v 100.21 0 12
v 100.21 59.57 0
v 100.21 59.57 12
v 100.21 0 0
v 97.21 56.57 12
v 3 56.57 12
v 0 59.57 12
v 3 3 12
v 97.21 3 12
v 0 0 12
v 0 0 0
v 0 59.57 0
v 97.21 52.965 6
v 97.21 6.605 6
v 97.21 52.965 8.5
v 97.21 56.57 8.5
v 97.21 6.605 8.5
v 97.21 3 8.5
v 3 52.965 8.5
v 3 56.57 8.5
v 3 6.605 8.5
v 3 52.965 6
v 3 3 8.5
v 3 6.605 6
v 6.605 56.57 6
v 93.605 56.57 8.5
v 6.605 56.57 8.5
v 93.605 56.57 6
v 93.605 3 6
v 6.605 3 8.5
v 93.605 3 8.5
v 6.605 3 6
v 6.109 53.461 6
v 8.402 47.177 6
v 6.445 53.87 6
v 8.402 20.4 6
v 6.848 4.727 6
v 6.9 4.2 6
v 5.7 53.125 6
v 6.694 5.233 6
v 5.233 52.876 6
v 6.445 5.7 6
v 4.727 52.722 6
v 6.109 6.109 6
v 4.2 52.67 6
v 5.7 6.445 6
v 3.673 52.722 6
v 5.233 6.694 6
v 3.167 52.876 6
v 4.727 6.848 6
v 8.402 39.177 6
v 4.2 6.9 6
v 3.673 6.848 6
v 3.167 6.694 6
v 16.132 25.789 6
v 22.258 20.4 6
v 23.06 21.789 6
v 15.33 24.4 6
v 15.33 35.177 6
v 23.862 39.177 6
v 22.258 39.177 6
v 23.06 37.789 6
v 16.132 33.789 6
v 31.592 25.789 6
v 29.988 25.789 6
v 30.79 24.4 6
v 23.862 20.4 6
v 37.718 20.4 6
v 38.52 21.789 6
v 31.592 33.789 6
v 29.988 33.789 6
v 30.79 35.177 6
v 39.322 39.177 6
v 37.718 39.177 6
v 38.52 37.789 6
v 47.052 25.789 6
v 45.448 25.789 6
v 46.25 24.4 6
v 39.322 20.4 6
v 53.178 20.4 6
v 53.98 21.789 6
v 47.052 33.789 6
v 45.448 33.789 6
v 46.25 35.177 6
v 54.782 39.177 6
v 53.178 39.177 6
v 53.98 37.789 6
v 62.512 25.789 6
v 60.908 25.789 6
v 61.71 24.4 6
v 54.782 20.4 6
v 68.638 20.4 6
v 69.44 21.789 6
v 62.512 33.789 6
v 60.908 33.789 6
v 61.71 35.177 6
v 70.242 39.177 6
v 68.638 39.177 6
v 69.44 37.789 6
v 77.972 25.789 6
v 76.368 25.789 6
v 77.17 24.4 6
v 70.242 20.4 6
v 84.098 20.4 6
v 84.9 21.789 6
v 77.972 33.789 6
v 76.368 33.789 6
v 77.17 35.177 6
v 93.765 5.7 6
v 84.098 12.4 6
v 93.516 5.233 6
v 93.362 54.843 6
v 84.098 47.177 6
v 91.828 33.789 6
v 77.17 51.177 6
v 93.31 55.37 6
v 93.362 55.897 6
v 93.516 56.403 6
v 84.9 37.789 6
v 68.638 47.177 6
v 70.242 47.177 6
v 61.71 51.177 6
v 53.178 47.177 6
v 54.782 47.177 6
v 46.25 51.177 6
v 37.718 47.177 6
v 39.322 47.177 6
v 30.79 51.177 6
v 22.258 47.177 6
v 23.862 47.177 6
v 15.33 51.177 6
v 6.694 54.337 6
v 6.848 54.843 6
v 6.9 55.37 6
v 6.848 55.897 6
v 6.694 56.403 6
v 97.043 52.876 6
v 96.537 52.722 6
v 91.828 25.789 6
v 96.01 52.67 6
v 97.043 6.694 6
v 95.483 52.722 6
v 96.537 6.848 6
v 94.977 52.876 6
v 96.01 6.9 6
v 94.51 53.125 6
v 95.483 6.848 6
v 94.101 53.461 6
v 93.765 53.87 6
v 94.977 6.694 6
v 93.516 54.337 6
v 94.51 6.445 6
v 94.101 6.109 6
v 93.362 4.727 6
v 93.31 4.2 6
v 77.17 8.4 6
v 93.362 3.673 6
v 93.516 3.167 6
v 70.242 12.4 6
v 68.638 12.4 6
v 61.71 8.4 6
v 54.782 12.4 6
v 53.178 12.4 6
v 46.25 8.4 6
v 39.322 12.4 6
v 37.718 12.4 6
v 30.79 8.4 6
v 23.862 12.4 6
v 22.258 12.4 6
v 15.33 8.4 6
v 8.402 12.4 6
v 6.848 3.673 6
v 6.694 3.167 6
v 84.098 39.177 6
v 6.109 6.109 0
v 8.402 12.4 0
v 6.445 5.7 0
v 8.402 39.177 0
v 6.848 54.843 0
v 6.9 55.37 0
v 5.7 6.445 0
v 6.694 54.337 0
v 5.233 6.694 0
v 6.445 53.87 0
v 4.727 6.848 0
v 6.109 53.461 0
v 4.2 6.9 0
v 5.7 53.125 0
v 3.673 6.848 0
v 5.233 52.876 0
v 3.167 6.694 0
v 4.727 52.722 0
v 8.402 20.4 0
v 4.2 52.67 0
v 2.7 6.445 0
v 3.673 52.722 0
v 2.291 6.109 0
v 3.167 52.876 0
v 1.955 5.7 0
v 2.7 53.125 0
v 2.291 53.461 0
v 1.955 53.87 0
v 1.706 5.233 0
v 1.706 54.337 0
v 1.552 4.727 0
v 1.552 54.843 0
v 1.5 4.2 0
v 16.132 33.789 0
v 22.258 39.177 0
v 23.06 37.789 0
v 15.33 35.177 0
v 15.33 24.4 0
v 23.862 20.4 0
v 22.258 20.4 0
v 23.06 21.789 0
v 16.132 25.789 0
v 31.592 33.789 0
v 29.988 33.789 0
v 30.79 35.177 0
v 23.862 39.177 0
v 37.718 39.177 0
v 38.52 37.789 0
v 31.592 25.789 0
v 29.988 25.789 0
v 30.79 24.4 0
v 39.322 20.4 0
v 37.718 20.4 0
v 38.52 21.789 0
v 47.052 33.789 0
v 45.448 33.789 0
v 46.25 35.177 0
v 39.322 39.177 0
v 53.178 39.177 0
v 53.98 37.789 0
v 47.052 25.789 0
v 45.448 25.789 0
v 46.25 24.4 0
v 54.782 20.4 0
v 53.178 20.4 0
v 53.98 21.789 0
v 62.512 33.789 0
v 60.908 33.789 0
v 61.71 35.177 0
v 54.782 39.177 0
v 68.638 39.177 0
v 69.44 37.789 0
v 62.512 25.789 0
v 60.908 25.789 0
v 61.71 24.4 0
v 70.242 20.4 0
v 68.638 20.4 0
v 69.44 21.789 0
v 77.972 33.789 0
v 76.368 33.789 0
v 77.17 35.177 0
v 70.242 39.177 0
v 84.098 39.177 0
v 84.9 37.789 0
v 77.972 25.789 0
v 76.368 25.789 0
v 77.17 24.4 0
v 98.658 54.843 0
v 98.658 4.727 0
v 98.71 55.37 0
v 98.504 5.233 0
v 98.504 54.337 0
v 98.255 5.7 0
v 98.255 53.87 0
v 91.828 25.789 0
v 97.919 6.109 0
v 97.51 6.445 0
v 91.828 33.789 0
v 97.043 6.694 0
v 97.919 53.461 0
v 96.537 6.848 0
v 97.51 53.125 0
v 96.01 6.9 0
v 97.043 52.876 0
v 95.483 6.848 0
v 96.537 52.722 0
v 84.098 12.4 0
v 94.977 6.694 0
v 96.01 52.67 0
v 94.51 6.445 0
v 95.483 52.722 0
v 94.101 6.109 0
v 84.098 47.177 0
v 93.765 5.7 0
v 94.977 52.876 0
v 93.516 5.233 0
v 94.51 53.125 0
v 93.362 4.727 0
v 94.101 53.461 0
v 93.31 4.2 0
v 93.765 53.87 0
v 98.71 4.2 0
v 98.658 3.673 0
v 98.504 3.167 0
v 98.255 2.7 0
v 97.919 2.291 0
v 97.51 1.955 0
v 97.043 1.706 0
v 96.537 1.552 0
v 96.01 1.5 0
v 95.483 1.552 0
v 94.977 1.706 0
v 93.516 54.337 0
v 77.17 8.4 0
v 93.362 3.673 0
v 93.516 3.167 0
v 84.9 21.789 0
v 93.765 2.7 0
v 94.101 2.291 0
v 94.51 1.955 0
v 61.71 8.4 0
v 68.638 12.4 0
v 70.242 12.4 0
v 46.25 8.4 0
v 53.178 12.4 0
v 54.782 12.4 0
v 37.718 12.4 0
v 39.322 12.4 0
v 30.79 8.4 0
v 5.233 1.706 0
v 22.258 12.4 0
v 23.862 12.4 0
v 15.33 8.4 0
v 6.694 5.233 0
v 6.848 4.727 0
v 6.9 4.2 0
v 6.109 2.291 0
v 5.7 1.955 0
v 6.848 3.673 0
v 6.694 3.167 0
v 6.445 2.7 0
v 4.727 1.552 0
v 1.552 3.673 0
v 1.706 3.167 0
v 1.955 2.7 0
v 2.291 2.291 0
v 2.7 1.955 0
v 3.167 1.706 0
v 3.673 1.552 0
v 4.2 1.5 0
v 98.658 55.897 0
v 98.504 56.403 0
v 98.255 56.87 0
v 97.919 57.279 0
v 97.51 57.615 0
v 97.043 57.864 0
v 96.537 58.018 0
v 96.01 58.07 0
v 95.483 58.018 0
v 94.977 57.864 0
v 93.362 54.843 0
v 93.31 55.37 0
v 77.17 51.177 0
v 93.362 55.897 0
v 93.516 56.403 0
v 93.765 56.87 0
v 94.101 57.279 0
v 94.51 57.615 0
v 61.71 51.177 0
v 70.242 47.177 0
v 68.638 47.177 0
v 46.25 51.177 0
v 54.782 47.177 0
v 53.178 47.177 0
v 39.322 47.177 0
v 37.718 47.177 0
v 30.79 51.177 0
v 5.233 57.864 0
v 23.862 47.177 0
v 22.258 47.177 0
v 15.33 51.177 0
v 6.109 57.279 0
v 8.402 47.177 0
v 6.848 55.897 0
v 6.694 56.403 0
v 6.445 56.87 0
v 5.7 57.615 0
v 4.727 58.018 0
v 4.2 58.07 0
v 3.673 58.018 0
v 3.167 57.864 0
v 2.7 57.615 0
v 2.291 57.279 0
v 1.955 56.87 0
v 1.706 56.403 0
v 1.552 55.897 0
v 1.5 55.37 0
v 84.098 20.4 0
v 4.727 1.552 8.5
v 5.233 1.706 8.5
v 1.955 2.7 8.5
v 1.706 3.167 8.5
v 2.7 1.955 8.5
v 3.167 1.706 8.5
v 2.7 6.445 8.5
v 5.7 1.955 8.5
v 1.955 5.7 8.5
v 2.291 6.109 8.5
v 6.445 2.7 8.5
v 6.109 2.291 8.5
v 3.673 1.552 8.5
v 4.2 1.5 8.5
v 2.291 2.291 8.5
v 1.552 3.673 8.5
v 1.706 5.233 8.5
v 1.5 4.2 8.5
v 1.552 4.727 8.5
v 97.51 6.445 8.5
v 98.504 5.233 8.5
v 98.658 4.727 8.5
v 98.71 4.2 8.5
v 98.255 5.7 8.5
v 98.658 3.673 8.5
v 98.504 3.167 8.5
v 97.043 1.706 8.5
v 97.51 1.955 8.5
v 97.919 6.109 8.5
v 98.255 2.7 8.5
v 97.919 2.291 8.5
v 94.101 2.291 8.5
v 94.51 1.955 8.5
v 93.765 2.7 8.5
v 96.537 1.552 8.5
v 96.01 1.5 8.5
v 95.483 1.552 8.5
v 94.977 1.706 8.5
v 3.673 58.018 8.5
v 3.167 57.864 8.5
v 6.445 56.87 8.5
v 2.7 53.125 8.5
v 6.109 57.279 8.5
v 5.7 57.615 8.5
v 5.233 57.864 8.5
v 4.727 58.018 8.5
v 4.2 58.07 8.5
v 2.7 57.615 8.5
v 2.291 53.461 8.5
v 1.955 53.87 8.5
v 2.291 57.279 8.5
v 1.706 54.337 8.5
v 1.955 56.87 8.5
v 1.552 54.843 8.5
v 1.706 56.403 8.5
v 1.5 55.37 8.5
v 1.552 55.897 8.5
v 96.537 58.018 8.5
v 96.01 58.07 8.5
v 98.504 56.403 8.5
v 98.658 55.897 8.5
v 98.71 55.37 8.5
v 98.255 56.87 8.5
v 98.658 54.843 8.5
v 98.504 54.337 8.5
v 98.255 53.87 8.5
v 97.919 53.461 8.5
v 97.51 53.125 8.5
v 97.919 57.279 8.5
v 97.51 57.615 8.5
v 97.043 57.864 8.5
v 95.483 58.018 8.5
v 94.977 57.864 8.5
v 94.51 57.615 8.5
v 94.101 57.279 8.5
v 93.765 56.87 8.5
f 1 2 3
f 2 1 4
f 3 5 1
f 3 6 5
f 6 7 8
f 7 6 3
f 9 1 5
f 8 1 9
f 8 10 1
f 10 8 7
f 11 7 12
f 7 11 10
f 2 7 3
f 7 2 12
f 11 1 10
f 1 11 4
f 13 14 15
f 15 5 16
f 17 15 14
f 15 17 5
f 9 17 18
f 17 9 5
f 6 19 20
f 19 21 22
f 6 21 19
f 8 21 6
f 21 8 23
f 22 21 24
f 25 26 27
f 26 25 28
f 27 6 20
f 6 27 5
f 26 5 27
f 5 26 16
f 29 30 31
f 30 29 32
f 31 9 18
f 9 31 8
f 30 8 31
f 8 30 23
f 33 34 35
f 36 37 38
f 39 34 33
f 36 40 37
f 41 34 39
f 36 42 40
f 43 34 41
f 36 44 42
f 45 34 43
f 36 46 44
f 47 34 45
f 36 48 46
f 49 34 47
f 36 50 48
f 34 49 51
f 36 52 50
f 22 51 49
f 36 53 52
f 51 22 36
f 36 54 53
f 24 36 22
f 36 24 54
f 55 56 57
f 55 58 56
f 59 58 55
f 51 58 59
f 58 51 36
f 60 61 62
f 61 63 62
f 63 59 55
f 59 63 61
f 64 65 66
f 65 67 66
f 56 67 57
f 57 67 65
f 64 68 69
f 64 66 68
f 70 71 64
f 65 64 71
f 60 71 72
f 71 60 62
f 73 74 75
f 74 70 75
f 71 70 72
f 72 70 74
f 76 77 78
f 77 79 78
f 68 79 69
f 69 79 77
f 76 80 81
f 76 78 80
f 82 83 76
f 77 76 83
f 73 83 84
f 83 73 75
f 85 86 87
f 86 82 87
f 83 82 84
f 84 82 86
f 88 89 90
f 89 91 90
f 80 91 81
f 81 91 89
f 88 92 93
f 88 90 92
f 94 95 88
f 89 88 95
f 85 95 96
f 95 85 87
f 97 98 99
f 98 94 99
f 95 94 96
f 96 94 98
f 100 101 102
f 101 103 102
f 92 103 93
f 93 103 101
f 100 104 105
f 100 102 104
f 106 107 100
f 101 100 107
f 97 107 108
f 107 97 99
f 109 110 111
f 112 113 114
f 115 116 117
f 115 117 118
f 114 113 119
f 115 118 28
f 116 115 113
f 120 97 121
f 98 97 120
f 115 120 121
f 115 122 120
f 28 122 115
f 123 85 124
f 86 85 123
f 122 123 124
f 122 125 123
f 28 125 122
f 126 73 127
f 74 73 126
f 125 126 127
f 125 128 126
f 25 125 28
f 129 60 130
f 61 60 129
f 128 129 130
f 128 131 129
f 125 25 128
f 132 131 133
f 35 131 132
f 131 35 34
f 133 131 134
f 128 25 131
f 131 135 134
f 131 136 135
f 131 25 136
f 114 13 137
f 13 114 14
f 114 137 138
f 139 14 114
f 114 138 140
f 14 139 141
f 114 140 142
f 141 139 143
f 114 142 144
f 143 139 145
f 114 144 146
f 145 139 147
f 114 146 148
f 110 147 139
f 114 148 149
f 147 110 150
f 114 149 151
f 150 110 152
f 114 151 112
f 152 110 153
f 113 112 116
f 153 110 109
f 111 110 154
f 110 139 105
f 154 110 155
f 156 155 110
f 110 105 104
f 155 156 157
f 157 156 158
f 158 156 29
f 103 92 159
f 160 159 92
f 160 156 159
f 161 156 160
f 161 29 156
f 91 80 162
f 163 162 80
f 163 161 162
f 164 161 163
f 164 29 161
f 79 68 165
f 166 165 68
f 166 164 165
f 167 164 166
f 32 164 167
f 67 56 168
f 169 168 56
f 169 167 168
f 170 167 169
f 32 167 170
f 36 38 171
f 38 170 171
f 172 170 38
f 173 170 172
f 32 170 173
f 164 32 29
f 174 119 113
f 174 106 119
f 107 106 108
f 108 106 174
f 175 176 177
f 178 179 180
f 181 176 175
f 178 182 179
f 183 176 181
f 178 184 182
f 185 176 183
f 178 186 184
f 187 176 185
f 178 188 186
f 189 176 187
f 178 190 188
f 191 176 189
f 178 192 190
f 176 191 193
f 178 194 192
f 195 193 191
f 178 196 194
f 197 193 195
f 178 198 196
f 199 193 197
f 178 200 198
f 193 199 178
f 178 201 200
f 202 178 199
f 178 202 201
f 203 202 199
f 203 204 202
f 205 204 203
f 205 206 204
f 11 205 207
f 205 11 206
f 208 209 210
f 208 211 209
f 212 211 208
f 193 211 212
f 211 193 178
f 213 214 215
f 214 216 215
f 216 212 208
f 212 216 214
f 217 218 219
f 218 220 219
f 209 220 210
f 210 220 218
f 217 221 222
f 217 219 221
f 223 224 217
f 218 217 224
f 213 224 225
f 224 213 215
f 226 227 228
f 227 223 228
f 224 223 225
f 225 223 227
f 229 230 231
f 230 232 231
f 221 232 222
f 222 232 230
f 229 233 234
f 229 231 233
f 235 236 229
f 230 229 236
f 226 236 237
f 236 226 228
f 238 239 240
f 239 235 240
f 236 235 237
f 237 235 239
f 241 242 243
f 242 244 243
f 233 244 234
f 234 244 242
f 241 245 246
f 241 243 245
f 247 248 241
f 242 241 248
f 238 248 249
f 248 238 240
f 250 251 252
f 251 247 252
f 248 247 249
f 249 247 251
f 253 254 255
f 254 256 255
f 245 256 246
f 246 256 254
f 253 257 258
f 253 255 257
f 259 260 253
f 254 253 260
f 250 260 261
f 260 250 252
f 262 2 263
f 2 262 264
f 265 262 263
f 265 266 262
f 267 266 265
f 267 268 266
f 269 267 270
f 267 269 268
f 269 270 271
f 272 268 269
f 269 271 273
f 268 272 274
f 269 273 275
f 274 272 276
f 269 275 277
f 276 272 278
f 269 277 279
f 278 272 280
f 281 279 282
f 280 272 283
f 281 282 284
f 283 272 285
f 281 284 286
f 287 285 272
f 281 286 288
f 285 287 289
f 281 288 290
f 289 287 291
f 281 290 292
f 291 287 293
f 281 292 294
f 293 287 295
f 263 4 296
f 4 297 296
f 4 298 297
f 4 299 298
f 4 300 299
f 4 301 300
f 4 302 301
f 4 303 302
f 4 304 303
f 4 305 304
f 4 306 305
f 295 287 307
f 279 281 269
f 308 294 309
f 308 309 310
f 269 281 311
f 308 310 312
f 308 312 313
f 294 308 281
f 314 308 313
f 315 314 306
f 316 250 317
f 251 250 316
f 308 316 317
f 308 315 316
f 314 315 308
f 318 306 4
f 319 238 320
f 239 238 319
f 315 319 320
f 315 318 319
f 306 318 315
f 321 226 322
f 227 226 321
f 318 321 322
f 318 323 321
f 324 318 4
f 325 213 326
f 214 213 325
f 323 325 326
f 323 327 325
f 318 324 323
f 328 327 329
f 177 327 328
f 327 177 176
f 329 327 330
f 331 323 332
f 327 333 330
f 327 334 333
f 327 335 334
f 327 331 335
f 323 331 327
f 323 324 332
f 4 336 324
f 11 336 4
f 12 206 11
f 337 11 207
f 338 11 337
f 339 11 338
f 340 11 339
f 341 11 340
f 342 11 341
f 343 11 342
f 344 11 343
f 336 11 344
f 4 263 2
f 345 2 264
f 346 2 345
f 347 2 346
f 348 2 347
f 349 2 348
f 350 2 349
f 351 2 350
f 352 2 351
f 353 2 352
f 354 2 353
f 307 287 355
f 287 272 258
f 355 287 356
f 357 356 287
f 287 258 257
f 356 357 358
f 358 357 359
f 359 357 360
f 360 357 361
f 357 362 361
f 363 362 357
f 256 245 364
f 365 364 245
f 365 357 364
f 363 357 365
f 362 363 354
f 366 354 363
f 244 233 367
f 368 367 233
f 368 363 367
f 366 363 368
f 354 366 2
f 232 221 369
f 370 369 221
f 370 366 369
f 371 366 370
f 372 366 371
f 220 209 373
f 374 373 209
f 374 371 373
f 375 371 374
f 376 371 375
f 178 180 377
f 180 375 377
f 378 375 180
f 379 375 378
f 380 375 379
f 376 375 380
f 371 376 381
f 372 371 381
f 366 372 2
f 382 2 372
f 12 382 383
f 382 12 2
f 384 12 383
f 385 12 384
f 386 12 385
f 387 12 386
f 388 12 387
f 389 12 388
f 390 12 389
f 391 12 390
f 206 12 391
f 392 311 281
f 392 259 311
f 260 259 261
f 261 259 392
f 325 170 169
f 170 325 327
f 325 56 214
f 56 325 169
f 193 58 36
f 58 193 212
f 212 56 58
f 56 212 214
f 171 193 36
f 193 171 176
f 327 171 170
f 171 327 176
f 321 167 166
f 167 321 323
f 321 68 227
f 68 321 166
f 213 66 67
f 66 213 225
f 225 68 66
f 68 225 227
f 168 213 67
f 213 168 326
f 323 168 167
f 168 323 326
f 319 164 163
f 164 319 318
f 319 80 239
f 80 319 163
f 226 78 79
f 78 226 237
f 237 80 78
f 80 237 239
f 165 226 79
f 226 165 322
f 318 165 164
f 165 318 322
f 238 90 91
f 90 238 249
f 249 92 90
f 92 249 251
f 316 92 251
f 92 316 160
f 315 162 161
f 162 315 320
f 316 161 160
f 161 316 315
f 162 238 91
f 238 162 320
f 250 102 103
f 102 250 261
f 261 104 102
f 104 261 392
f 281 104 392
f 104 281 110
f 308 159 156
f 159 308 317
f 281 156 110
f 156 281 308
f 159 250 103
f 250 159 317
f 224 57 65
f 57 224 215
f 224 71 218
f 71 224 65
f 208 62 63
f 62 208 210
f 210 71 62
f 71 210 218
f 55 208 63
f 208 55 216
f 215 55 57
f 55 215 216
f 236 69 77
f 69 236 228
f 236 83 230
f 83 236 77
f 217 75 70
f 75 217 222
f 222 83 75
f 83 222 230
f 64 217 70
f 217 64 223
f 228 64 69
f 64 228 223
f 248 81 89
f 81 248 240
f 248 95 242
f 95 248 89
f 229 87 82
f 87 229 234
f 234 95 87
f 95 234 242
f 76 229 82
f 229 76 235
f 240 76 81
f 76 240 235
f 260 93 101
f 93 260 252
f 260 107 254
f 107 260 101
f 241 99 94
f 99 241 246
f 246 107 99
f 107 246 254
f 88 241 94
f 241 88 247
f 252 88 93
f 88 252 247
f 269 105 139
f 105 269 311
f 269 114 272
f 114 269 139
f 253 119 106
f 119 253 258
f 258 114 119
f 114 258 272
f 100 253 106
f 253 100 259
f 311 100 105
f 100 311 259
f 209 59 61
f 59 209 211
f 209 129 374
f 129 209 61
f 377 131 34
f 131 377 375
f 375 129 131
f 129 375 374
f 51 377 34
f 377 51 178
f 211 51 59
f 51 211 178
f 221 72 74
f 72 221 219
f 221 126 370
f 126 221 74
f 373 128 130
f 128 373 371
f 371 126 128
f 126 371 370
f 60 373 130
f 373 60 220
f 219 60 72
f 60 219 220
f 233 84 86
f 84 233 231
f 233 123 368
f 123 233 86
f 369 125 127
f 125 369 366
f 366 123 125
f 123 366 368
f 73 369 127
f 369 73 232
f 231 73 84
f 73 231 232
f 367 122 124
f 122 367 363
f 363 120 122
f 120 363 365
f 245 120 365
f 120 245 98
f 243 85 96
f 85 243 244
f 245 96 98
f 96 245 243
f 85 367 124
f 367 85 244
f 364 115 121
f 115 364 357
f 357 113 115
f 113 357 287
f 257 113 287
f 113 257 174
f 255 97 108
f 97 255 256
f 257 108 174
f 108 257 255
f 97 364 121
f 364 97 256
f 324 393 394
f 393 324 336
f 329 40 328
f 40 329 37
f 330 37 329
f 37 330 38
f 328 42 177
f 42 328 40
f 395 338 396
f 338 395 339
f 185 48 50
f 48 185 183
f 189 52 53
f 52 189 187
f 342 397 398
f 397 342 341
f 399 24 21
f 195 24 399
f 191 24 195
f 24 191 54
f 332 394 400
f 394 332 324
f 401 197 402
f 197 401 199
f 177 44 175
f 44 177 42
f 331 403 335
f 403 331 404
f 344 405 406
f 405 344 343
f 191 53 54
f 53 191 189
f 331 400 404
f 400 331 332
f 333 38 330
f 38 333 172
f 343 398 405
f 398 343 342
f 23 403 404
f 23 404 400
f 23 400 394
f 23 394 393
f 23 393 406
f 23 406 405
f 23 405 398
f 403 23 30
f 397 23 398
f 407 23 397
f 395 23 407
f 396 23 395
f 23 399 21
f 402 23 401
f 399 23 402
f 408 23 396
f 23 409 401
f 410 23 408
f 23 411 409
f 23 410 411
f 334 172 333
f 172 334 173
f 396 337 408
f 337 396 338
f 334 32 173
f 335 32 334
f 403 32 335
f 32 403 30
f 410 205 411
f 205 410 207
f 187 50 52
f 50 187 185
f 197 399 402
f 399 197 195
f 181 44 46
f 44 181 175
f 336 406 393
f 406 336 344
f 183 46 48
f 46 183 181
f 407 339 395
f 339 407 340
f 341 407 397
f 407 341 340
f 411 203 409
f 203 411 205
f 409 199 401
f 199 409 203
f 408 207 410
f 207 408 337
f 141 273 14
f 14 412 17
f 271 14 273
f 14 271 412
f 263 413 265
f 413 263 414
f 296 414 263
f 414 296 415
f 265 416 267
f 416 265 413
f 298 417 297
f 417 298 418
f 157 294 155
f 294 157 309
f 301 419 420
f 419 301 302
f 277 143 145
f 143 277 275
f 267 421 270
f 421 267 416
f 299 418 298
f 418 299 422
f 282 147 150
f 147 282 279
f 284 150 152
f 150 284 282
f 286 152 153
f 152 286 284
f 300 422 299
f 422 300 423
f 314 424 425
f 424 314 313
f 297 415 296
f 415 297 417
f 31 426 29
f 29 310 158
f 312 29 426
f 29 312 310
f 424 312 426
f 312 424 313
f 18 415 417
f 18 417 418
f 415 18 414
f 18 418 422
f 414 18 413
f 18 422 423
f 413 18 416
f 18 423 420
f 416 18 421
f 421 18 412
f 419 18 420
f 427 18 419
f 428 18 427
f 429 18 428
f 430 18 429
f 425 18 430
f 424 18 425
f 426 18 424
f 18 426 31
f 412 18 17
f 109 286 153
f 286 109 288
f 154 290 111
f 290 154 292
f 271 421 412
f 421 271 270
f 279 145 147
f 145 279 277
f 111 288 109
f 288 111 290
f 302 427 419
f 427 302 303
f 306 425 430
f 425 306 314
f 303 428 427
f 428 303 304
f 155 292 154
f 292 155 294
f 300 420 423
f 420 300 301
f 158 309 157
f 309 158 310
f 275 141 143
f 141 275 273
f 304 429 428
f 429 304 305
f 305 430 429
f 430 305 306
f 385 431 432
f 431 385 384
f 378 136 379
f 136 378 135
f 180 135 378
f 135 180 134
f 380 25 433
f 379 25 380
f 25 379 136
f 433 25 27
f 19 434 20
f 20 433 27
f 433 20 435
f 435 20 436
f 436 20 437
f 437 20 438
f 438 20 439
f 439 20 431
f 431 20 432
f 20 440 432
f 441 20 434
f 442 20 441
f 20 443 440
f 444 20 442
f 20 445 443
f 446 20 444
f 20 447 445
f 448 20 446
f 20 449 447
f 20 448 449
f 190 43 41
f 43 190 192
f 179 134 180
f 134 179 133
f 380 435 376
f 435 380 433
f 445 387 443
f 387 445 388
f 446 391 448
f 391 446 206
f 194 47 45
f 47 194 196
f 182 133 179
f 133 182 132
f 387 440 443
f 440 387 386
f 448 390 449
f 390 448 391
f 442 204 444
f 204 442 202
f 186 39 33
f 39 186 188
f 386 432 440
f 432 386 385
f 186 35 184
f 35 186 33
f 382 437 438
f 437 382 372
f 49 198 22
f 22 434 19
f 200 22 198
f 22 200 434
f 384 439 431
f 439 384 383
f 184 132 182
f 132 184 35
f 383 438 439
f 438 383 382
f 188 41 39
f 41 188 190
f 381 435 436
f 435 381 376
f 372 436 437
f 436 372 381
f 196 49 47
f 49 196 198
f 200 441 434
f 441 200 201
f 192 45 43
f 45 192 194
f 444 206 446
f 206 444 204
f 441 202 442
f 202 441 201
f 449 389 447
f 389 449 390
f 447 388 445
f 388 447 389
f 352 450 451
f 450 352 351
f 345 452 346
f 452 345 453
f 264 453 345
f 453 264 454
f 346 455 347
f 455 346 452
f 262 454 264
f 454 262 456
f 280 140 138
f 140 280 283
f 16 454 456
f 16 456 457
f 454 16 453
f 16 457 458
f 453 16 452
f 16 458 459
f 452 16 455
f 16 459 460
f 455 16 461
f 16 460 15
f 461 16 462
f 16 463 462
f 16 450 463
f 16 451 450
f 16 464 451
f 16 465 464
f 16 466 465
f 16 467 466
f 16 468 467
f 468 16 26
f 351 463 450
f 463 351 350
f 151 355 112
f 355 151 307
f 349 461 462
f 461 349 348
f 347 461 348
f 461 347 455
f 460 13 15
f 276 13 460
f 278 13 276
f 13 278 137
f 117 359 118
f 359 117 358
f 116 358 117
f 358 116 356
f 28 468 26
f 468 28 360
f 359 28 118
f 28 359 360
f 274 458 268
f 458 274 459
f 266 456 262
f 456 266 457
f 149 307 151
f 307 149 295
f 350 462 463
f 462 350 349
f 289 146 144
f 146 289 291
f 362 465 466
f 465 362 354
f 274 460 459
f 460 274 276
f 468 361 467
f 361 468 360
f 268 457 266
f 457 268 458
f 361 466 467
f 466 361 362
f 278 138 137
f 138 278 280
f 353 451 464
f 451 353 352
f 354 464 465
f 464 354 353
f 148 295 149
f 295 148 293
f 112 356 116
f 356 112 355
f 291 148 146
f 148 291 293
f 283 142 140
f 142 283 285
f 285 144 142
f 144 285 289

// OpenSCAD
$fn = 32;

// ----------------------------------------------------------------------
// Honeycomb panel: 100.21 x 59.57 mm, 15 cells of 16 mm
// ----------------------------------------------------------------------

// --- parameters (mm) ---
panel_w = 100.21;         // panel width
panel_d = 59.57;          // panel depth
thick = 6;                // panel thickness
cell_r = 8;               // hex cell circumradius
pitch = 15.46;            // hex cell pitch (centre to centre)
web = 1.6;                // web between the cells
columns = 5;              // columns of cells
rows = 3;                 // rows of cells
cell_count = 15;          // total cells
shift_x = 15.33;          // first cell offset in x
shift_y = 16.4;           // first cell offset in y
mount_d = 5.4;            // corner mounting holes
hole_off = 4.2;           // mounting hole offset from the corners
rim_h = 12;               // rim height
rim_t = 3;                // rim wall thickness

difference() {
  union() {
    cube([panel_w, panel_d, thick]);
    /* rim around the panel, sunk 1 mm into the plate */
    translate([0, 0, thick - 1]) difference() {
      cube([panel_w, panel_d, rim_h - thick + 1]);
      translate([rim_t, rim_t, -2.5]) cube([panel_w - 2 * rim_t, panel_d - 2 * rim_t, rim_h - thick + 6]);
    }
  }
  /* hexagonal cells, point-up, cut right through the plate */
  for (row = [0 : rows - 1]) {
    for (col = [0 : columns - 1]) {
      translate([shift_x + col * pitch + (row % 2) * pitch / 2, shift_y + row * pitch * 0.866025, -2.5]) rotate([0, 0, 30]) cylinder(h = thick + 5, d = 2 * cell_r, $fn = 6);
    }
  }
  /* corner mounting holes, clear of the outer cell web */
  translate([4.2, 4.2, -2.5]) cylinder(h = thick + 5, d = mount_d);
  translate([96.01, 4.2, -2.5]) cylinder(h = thick + 5, d = mount_d);
  translate([4.2, 55.37, -2.5]) cylinder(h = thick + 5, d = mount_d);
  translate([96.01, 55.37, -2.5]) cylinder(h = thick + 5, d = mount_d);
}
